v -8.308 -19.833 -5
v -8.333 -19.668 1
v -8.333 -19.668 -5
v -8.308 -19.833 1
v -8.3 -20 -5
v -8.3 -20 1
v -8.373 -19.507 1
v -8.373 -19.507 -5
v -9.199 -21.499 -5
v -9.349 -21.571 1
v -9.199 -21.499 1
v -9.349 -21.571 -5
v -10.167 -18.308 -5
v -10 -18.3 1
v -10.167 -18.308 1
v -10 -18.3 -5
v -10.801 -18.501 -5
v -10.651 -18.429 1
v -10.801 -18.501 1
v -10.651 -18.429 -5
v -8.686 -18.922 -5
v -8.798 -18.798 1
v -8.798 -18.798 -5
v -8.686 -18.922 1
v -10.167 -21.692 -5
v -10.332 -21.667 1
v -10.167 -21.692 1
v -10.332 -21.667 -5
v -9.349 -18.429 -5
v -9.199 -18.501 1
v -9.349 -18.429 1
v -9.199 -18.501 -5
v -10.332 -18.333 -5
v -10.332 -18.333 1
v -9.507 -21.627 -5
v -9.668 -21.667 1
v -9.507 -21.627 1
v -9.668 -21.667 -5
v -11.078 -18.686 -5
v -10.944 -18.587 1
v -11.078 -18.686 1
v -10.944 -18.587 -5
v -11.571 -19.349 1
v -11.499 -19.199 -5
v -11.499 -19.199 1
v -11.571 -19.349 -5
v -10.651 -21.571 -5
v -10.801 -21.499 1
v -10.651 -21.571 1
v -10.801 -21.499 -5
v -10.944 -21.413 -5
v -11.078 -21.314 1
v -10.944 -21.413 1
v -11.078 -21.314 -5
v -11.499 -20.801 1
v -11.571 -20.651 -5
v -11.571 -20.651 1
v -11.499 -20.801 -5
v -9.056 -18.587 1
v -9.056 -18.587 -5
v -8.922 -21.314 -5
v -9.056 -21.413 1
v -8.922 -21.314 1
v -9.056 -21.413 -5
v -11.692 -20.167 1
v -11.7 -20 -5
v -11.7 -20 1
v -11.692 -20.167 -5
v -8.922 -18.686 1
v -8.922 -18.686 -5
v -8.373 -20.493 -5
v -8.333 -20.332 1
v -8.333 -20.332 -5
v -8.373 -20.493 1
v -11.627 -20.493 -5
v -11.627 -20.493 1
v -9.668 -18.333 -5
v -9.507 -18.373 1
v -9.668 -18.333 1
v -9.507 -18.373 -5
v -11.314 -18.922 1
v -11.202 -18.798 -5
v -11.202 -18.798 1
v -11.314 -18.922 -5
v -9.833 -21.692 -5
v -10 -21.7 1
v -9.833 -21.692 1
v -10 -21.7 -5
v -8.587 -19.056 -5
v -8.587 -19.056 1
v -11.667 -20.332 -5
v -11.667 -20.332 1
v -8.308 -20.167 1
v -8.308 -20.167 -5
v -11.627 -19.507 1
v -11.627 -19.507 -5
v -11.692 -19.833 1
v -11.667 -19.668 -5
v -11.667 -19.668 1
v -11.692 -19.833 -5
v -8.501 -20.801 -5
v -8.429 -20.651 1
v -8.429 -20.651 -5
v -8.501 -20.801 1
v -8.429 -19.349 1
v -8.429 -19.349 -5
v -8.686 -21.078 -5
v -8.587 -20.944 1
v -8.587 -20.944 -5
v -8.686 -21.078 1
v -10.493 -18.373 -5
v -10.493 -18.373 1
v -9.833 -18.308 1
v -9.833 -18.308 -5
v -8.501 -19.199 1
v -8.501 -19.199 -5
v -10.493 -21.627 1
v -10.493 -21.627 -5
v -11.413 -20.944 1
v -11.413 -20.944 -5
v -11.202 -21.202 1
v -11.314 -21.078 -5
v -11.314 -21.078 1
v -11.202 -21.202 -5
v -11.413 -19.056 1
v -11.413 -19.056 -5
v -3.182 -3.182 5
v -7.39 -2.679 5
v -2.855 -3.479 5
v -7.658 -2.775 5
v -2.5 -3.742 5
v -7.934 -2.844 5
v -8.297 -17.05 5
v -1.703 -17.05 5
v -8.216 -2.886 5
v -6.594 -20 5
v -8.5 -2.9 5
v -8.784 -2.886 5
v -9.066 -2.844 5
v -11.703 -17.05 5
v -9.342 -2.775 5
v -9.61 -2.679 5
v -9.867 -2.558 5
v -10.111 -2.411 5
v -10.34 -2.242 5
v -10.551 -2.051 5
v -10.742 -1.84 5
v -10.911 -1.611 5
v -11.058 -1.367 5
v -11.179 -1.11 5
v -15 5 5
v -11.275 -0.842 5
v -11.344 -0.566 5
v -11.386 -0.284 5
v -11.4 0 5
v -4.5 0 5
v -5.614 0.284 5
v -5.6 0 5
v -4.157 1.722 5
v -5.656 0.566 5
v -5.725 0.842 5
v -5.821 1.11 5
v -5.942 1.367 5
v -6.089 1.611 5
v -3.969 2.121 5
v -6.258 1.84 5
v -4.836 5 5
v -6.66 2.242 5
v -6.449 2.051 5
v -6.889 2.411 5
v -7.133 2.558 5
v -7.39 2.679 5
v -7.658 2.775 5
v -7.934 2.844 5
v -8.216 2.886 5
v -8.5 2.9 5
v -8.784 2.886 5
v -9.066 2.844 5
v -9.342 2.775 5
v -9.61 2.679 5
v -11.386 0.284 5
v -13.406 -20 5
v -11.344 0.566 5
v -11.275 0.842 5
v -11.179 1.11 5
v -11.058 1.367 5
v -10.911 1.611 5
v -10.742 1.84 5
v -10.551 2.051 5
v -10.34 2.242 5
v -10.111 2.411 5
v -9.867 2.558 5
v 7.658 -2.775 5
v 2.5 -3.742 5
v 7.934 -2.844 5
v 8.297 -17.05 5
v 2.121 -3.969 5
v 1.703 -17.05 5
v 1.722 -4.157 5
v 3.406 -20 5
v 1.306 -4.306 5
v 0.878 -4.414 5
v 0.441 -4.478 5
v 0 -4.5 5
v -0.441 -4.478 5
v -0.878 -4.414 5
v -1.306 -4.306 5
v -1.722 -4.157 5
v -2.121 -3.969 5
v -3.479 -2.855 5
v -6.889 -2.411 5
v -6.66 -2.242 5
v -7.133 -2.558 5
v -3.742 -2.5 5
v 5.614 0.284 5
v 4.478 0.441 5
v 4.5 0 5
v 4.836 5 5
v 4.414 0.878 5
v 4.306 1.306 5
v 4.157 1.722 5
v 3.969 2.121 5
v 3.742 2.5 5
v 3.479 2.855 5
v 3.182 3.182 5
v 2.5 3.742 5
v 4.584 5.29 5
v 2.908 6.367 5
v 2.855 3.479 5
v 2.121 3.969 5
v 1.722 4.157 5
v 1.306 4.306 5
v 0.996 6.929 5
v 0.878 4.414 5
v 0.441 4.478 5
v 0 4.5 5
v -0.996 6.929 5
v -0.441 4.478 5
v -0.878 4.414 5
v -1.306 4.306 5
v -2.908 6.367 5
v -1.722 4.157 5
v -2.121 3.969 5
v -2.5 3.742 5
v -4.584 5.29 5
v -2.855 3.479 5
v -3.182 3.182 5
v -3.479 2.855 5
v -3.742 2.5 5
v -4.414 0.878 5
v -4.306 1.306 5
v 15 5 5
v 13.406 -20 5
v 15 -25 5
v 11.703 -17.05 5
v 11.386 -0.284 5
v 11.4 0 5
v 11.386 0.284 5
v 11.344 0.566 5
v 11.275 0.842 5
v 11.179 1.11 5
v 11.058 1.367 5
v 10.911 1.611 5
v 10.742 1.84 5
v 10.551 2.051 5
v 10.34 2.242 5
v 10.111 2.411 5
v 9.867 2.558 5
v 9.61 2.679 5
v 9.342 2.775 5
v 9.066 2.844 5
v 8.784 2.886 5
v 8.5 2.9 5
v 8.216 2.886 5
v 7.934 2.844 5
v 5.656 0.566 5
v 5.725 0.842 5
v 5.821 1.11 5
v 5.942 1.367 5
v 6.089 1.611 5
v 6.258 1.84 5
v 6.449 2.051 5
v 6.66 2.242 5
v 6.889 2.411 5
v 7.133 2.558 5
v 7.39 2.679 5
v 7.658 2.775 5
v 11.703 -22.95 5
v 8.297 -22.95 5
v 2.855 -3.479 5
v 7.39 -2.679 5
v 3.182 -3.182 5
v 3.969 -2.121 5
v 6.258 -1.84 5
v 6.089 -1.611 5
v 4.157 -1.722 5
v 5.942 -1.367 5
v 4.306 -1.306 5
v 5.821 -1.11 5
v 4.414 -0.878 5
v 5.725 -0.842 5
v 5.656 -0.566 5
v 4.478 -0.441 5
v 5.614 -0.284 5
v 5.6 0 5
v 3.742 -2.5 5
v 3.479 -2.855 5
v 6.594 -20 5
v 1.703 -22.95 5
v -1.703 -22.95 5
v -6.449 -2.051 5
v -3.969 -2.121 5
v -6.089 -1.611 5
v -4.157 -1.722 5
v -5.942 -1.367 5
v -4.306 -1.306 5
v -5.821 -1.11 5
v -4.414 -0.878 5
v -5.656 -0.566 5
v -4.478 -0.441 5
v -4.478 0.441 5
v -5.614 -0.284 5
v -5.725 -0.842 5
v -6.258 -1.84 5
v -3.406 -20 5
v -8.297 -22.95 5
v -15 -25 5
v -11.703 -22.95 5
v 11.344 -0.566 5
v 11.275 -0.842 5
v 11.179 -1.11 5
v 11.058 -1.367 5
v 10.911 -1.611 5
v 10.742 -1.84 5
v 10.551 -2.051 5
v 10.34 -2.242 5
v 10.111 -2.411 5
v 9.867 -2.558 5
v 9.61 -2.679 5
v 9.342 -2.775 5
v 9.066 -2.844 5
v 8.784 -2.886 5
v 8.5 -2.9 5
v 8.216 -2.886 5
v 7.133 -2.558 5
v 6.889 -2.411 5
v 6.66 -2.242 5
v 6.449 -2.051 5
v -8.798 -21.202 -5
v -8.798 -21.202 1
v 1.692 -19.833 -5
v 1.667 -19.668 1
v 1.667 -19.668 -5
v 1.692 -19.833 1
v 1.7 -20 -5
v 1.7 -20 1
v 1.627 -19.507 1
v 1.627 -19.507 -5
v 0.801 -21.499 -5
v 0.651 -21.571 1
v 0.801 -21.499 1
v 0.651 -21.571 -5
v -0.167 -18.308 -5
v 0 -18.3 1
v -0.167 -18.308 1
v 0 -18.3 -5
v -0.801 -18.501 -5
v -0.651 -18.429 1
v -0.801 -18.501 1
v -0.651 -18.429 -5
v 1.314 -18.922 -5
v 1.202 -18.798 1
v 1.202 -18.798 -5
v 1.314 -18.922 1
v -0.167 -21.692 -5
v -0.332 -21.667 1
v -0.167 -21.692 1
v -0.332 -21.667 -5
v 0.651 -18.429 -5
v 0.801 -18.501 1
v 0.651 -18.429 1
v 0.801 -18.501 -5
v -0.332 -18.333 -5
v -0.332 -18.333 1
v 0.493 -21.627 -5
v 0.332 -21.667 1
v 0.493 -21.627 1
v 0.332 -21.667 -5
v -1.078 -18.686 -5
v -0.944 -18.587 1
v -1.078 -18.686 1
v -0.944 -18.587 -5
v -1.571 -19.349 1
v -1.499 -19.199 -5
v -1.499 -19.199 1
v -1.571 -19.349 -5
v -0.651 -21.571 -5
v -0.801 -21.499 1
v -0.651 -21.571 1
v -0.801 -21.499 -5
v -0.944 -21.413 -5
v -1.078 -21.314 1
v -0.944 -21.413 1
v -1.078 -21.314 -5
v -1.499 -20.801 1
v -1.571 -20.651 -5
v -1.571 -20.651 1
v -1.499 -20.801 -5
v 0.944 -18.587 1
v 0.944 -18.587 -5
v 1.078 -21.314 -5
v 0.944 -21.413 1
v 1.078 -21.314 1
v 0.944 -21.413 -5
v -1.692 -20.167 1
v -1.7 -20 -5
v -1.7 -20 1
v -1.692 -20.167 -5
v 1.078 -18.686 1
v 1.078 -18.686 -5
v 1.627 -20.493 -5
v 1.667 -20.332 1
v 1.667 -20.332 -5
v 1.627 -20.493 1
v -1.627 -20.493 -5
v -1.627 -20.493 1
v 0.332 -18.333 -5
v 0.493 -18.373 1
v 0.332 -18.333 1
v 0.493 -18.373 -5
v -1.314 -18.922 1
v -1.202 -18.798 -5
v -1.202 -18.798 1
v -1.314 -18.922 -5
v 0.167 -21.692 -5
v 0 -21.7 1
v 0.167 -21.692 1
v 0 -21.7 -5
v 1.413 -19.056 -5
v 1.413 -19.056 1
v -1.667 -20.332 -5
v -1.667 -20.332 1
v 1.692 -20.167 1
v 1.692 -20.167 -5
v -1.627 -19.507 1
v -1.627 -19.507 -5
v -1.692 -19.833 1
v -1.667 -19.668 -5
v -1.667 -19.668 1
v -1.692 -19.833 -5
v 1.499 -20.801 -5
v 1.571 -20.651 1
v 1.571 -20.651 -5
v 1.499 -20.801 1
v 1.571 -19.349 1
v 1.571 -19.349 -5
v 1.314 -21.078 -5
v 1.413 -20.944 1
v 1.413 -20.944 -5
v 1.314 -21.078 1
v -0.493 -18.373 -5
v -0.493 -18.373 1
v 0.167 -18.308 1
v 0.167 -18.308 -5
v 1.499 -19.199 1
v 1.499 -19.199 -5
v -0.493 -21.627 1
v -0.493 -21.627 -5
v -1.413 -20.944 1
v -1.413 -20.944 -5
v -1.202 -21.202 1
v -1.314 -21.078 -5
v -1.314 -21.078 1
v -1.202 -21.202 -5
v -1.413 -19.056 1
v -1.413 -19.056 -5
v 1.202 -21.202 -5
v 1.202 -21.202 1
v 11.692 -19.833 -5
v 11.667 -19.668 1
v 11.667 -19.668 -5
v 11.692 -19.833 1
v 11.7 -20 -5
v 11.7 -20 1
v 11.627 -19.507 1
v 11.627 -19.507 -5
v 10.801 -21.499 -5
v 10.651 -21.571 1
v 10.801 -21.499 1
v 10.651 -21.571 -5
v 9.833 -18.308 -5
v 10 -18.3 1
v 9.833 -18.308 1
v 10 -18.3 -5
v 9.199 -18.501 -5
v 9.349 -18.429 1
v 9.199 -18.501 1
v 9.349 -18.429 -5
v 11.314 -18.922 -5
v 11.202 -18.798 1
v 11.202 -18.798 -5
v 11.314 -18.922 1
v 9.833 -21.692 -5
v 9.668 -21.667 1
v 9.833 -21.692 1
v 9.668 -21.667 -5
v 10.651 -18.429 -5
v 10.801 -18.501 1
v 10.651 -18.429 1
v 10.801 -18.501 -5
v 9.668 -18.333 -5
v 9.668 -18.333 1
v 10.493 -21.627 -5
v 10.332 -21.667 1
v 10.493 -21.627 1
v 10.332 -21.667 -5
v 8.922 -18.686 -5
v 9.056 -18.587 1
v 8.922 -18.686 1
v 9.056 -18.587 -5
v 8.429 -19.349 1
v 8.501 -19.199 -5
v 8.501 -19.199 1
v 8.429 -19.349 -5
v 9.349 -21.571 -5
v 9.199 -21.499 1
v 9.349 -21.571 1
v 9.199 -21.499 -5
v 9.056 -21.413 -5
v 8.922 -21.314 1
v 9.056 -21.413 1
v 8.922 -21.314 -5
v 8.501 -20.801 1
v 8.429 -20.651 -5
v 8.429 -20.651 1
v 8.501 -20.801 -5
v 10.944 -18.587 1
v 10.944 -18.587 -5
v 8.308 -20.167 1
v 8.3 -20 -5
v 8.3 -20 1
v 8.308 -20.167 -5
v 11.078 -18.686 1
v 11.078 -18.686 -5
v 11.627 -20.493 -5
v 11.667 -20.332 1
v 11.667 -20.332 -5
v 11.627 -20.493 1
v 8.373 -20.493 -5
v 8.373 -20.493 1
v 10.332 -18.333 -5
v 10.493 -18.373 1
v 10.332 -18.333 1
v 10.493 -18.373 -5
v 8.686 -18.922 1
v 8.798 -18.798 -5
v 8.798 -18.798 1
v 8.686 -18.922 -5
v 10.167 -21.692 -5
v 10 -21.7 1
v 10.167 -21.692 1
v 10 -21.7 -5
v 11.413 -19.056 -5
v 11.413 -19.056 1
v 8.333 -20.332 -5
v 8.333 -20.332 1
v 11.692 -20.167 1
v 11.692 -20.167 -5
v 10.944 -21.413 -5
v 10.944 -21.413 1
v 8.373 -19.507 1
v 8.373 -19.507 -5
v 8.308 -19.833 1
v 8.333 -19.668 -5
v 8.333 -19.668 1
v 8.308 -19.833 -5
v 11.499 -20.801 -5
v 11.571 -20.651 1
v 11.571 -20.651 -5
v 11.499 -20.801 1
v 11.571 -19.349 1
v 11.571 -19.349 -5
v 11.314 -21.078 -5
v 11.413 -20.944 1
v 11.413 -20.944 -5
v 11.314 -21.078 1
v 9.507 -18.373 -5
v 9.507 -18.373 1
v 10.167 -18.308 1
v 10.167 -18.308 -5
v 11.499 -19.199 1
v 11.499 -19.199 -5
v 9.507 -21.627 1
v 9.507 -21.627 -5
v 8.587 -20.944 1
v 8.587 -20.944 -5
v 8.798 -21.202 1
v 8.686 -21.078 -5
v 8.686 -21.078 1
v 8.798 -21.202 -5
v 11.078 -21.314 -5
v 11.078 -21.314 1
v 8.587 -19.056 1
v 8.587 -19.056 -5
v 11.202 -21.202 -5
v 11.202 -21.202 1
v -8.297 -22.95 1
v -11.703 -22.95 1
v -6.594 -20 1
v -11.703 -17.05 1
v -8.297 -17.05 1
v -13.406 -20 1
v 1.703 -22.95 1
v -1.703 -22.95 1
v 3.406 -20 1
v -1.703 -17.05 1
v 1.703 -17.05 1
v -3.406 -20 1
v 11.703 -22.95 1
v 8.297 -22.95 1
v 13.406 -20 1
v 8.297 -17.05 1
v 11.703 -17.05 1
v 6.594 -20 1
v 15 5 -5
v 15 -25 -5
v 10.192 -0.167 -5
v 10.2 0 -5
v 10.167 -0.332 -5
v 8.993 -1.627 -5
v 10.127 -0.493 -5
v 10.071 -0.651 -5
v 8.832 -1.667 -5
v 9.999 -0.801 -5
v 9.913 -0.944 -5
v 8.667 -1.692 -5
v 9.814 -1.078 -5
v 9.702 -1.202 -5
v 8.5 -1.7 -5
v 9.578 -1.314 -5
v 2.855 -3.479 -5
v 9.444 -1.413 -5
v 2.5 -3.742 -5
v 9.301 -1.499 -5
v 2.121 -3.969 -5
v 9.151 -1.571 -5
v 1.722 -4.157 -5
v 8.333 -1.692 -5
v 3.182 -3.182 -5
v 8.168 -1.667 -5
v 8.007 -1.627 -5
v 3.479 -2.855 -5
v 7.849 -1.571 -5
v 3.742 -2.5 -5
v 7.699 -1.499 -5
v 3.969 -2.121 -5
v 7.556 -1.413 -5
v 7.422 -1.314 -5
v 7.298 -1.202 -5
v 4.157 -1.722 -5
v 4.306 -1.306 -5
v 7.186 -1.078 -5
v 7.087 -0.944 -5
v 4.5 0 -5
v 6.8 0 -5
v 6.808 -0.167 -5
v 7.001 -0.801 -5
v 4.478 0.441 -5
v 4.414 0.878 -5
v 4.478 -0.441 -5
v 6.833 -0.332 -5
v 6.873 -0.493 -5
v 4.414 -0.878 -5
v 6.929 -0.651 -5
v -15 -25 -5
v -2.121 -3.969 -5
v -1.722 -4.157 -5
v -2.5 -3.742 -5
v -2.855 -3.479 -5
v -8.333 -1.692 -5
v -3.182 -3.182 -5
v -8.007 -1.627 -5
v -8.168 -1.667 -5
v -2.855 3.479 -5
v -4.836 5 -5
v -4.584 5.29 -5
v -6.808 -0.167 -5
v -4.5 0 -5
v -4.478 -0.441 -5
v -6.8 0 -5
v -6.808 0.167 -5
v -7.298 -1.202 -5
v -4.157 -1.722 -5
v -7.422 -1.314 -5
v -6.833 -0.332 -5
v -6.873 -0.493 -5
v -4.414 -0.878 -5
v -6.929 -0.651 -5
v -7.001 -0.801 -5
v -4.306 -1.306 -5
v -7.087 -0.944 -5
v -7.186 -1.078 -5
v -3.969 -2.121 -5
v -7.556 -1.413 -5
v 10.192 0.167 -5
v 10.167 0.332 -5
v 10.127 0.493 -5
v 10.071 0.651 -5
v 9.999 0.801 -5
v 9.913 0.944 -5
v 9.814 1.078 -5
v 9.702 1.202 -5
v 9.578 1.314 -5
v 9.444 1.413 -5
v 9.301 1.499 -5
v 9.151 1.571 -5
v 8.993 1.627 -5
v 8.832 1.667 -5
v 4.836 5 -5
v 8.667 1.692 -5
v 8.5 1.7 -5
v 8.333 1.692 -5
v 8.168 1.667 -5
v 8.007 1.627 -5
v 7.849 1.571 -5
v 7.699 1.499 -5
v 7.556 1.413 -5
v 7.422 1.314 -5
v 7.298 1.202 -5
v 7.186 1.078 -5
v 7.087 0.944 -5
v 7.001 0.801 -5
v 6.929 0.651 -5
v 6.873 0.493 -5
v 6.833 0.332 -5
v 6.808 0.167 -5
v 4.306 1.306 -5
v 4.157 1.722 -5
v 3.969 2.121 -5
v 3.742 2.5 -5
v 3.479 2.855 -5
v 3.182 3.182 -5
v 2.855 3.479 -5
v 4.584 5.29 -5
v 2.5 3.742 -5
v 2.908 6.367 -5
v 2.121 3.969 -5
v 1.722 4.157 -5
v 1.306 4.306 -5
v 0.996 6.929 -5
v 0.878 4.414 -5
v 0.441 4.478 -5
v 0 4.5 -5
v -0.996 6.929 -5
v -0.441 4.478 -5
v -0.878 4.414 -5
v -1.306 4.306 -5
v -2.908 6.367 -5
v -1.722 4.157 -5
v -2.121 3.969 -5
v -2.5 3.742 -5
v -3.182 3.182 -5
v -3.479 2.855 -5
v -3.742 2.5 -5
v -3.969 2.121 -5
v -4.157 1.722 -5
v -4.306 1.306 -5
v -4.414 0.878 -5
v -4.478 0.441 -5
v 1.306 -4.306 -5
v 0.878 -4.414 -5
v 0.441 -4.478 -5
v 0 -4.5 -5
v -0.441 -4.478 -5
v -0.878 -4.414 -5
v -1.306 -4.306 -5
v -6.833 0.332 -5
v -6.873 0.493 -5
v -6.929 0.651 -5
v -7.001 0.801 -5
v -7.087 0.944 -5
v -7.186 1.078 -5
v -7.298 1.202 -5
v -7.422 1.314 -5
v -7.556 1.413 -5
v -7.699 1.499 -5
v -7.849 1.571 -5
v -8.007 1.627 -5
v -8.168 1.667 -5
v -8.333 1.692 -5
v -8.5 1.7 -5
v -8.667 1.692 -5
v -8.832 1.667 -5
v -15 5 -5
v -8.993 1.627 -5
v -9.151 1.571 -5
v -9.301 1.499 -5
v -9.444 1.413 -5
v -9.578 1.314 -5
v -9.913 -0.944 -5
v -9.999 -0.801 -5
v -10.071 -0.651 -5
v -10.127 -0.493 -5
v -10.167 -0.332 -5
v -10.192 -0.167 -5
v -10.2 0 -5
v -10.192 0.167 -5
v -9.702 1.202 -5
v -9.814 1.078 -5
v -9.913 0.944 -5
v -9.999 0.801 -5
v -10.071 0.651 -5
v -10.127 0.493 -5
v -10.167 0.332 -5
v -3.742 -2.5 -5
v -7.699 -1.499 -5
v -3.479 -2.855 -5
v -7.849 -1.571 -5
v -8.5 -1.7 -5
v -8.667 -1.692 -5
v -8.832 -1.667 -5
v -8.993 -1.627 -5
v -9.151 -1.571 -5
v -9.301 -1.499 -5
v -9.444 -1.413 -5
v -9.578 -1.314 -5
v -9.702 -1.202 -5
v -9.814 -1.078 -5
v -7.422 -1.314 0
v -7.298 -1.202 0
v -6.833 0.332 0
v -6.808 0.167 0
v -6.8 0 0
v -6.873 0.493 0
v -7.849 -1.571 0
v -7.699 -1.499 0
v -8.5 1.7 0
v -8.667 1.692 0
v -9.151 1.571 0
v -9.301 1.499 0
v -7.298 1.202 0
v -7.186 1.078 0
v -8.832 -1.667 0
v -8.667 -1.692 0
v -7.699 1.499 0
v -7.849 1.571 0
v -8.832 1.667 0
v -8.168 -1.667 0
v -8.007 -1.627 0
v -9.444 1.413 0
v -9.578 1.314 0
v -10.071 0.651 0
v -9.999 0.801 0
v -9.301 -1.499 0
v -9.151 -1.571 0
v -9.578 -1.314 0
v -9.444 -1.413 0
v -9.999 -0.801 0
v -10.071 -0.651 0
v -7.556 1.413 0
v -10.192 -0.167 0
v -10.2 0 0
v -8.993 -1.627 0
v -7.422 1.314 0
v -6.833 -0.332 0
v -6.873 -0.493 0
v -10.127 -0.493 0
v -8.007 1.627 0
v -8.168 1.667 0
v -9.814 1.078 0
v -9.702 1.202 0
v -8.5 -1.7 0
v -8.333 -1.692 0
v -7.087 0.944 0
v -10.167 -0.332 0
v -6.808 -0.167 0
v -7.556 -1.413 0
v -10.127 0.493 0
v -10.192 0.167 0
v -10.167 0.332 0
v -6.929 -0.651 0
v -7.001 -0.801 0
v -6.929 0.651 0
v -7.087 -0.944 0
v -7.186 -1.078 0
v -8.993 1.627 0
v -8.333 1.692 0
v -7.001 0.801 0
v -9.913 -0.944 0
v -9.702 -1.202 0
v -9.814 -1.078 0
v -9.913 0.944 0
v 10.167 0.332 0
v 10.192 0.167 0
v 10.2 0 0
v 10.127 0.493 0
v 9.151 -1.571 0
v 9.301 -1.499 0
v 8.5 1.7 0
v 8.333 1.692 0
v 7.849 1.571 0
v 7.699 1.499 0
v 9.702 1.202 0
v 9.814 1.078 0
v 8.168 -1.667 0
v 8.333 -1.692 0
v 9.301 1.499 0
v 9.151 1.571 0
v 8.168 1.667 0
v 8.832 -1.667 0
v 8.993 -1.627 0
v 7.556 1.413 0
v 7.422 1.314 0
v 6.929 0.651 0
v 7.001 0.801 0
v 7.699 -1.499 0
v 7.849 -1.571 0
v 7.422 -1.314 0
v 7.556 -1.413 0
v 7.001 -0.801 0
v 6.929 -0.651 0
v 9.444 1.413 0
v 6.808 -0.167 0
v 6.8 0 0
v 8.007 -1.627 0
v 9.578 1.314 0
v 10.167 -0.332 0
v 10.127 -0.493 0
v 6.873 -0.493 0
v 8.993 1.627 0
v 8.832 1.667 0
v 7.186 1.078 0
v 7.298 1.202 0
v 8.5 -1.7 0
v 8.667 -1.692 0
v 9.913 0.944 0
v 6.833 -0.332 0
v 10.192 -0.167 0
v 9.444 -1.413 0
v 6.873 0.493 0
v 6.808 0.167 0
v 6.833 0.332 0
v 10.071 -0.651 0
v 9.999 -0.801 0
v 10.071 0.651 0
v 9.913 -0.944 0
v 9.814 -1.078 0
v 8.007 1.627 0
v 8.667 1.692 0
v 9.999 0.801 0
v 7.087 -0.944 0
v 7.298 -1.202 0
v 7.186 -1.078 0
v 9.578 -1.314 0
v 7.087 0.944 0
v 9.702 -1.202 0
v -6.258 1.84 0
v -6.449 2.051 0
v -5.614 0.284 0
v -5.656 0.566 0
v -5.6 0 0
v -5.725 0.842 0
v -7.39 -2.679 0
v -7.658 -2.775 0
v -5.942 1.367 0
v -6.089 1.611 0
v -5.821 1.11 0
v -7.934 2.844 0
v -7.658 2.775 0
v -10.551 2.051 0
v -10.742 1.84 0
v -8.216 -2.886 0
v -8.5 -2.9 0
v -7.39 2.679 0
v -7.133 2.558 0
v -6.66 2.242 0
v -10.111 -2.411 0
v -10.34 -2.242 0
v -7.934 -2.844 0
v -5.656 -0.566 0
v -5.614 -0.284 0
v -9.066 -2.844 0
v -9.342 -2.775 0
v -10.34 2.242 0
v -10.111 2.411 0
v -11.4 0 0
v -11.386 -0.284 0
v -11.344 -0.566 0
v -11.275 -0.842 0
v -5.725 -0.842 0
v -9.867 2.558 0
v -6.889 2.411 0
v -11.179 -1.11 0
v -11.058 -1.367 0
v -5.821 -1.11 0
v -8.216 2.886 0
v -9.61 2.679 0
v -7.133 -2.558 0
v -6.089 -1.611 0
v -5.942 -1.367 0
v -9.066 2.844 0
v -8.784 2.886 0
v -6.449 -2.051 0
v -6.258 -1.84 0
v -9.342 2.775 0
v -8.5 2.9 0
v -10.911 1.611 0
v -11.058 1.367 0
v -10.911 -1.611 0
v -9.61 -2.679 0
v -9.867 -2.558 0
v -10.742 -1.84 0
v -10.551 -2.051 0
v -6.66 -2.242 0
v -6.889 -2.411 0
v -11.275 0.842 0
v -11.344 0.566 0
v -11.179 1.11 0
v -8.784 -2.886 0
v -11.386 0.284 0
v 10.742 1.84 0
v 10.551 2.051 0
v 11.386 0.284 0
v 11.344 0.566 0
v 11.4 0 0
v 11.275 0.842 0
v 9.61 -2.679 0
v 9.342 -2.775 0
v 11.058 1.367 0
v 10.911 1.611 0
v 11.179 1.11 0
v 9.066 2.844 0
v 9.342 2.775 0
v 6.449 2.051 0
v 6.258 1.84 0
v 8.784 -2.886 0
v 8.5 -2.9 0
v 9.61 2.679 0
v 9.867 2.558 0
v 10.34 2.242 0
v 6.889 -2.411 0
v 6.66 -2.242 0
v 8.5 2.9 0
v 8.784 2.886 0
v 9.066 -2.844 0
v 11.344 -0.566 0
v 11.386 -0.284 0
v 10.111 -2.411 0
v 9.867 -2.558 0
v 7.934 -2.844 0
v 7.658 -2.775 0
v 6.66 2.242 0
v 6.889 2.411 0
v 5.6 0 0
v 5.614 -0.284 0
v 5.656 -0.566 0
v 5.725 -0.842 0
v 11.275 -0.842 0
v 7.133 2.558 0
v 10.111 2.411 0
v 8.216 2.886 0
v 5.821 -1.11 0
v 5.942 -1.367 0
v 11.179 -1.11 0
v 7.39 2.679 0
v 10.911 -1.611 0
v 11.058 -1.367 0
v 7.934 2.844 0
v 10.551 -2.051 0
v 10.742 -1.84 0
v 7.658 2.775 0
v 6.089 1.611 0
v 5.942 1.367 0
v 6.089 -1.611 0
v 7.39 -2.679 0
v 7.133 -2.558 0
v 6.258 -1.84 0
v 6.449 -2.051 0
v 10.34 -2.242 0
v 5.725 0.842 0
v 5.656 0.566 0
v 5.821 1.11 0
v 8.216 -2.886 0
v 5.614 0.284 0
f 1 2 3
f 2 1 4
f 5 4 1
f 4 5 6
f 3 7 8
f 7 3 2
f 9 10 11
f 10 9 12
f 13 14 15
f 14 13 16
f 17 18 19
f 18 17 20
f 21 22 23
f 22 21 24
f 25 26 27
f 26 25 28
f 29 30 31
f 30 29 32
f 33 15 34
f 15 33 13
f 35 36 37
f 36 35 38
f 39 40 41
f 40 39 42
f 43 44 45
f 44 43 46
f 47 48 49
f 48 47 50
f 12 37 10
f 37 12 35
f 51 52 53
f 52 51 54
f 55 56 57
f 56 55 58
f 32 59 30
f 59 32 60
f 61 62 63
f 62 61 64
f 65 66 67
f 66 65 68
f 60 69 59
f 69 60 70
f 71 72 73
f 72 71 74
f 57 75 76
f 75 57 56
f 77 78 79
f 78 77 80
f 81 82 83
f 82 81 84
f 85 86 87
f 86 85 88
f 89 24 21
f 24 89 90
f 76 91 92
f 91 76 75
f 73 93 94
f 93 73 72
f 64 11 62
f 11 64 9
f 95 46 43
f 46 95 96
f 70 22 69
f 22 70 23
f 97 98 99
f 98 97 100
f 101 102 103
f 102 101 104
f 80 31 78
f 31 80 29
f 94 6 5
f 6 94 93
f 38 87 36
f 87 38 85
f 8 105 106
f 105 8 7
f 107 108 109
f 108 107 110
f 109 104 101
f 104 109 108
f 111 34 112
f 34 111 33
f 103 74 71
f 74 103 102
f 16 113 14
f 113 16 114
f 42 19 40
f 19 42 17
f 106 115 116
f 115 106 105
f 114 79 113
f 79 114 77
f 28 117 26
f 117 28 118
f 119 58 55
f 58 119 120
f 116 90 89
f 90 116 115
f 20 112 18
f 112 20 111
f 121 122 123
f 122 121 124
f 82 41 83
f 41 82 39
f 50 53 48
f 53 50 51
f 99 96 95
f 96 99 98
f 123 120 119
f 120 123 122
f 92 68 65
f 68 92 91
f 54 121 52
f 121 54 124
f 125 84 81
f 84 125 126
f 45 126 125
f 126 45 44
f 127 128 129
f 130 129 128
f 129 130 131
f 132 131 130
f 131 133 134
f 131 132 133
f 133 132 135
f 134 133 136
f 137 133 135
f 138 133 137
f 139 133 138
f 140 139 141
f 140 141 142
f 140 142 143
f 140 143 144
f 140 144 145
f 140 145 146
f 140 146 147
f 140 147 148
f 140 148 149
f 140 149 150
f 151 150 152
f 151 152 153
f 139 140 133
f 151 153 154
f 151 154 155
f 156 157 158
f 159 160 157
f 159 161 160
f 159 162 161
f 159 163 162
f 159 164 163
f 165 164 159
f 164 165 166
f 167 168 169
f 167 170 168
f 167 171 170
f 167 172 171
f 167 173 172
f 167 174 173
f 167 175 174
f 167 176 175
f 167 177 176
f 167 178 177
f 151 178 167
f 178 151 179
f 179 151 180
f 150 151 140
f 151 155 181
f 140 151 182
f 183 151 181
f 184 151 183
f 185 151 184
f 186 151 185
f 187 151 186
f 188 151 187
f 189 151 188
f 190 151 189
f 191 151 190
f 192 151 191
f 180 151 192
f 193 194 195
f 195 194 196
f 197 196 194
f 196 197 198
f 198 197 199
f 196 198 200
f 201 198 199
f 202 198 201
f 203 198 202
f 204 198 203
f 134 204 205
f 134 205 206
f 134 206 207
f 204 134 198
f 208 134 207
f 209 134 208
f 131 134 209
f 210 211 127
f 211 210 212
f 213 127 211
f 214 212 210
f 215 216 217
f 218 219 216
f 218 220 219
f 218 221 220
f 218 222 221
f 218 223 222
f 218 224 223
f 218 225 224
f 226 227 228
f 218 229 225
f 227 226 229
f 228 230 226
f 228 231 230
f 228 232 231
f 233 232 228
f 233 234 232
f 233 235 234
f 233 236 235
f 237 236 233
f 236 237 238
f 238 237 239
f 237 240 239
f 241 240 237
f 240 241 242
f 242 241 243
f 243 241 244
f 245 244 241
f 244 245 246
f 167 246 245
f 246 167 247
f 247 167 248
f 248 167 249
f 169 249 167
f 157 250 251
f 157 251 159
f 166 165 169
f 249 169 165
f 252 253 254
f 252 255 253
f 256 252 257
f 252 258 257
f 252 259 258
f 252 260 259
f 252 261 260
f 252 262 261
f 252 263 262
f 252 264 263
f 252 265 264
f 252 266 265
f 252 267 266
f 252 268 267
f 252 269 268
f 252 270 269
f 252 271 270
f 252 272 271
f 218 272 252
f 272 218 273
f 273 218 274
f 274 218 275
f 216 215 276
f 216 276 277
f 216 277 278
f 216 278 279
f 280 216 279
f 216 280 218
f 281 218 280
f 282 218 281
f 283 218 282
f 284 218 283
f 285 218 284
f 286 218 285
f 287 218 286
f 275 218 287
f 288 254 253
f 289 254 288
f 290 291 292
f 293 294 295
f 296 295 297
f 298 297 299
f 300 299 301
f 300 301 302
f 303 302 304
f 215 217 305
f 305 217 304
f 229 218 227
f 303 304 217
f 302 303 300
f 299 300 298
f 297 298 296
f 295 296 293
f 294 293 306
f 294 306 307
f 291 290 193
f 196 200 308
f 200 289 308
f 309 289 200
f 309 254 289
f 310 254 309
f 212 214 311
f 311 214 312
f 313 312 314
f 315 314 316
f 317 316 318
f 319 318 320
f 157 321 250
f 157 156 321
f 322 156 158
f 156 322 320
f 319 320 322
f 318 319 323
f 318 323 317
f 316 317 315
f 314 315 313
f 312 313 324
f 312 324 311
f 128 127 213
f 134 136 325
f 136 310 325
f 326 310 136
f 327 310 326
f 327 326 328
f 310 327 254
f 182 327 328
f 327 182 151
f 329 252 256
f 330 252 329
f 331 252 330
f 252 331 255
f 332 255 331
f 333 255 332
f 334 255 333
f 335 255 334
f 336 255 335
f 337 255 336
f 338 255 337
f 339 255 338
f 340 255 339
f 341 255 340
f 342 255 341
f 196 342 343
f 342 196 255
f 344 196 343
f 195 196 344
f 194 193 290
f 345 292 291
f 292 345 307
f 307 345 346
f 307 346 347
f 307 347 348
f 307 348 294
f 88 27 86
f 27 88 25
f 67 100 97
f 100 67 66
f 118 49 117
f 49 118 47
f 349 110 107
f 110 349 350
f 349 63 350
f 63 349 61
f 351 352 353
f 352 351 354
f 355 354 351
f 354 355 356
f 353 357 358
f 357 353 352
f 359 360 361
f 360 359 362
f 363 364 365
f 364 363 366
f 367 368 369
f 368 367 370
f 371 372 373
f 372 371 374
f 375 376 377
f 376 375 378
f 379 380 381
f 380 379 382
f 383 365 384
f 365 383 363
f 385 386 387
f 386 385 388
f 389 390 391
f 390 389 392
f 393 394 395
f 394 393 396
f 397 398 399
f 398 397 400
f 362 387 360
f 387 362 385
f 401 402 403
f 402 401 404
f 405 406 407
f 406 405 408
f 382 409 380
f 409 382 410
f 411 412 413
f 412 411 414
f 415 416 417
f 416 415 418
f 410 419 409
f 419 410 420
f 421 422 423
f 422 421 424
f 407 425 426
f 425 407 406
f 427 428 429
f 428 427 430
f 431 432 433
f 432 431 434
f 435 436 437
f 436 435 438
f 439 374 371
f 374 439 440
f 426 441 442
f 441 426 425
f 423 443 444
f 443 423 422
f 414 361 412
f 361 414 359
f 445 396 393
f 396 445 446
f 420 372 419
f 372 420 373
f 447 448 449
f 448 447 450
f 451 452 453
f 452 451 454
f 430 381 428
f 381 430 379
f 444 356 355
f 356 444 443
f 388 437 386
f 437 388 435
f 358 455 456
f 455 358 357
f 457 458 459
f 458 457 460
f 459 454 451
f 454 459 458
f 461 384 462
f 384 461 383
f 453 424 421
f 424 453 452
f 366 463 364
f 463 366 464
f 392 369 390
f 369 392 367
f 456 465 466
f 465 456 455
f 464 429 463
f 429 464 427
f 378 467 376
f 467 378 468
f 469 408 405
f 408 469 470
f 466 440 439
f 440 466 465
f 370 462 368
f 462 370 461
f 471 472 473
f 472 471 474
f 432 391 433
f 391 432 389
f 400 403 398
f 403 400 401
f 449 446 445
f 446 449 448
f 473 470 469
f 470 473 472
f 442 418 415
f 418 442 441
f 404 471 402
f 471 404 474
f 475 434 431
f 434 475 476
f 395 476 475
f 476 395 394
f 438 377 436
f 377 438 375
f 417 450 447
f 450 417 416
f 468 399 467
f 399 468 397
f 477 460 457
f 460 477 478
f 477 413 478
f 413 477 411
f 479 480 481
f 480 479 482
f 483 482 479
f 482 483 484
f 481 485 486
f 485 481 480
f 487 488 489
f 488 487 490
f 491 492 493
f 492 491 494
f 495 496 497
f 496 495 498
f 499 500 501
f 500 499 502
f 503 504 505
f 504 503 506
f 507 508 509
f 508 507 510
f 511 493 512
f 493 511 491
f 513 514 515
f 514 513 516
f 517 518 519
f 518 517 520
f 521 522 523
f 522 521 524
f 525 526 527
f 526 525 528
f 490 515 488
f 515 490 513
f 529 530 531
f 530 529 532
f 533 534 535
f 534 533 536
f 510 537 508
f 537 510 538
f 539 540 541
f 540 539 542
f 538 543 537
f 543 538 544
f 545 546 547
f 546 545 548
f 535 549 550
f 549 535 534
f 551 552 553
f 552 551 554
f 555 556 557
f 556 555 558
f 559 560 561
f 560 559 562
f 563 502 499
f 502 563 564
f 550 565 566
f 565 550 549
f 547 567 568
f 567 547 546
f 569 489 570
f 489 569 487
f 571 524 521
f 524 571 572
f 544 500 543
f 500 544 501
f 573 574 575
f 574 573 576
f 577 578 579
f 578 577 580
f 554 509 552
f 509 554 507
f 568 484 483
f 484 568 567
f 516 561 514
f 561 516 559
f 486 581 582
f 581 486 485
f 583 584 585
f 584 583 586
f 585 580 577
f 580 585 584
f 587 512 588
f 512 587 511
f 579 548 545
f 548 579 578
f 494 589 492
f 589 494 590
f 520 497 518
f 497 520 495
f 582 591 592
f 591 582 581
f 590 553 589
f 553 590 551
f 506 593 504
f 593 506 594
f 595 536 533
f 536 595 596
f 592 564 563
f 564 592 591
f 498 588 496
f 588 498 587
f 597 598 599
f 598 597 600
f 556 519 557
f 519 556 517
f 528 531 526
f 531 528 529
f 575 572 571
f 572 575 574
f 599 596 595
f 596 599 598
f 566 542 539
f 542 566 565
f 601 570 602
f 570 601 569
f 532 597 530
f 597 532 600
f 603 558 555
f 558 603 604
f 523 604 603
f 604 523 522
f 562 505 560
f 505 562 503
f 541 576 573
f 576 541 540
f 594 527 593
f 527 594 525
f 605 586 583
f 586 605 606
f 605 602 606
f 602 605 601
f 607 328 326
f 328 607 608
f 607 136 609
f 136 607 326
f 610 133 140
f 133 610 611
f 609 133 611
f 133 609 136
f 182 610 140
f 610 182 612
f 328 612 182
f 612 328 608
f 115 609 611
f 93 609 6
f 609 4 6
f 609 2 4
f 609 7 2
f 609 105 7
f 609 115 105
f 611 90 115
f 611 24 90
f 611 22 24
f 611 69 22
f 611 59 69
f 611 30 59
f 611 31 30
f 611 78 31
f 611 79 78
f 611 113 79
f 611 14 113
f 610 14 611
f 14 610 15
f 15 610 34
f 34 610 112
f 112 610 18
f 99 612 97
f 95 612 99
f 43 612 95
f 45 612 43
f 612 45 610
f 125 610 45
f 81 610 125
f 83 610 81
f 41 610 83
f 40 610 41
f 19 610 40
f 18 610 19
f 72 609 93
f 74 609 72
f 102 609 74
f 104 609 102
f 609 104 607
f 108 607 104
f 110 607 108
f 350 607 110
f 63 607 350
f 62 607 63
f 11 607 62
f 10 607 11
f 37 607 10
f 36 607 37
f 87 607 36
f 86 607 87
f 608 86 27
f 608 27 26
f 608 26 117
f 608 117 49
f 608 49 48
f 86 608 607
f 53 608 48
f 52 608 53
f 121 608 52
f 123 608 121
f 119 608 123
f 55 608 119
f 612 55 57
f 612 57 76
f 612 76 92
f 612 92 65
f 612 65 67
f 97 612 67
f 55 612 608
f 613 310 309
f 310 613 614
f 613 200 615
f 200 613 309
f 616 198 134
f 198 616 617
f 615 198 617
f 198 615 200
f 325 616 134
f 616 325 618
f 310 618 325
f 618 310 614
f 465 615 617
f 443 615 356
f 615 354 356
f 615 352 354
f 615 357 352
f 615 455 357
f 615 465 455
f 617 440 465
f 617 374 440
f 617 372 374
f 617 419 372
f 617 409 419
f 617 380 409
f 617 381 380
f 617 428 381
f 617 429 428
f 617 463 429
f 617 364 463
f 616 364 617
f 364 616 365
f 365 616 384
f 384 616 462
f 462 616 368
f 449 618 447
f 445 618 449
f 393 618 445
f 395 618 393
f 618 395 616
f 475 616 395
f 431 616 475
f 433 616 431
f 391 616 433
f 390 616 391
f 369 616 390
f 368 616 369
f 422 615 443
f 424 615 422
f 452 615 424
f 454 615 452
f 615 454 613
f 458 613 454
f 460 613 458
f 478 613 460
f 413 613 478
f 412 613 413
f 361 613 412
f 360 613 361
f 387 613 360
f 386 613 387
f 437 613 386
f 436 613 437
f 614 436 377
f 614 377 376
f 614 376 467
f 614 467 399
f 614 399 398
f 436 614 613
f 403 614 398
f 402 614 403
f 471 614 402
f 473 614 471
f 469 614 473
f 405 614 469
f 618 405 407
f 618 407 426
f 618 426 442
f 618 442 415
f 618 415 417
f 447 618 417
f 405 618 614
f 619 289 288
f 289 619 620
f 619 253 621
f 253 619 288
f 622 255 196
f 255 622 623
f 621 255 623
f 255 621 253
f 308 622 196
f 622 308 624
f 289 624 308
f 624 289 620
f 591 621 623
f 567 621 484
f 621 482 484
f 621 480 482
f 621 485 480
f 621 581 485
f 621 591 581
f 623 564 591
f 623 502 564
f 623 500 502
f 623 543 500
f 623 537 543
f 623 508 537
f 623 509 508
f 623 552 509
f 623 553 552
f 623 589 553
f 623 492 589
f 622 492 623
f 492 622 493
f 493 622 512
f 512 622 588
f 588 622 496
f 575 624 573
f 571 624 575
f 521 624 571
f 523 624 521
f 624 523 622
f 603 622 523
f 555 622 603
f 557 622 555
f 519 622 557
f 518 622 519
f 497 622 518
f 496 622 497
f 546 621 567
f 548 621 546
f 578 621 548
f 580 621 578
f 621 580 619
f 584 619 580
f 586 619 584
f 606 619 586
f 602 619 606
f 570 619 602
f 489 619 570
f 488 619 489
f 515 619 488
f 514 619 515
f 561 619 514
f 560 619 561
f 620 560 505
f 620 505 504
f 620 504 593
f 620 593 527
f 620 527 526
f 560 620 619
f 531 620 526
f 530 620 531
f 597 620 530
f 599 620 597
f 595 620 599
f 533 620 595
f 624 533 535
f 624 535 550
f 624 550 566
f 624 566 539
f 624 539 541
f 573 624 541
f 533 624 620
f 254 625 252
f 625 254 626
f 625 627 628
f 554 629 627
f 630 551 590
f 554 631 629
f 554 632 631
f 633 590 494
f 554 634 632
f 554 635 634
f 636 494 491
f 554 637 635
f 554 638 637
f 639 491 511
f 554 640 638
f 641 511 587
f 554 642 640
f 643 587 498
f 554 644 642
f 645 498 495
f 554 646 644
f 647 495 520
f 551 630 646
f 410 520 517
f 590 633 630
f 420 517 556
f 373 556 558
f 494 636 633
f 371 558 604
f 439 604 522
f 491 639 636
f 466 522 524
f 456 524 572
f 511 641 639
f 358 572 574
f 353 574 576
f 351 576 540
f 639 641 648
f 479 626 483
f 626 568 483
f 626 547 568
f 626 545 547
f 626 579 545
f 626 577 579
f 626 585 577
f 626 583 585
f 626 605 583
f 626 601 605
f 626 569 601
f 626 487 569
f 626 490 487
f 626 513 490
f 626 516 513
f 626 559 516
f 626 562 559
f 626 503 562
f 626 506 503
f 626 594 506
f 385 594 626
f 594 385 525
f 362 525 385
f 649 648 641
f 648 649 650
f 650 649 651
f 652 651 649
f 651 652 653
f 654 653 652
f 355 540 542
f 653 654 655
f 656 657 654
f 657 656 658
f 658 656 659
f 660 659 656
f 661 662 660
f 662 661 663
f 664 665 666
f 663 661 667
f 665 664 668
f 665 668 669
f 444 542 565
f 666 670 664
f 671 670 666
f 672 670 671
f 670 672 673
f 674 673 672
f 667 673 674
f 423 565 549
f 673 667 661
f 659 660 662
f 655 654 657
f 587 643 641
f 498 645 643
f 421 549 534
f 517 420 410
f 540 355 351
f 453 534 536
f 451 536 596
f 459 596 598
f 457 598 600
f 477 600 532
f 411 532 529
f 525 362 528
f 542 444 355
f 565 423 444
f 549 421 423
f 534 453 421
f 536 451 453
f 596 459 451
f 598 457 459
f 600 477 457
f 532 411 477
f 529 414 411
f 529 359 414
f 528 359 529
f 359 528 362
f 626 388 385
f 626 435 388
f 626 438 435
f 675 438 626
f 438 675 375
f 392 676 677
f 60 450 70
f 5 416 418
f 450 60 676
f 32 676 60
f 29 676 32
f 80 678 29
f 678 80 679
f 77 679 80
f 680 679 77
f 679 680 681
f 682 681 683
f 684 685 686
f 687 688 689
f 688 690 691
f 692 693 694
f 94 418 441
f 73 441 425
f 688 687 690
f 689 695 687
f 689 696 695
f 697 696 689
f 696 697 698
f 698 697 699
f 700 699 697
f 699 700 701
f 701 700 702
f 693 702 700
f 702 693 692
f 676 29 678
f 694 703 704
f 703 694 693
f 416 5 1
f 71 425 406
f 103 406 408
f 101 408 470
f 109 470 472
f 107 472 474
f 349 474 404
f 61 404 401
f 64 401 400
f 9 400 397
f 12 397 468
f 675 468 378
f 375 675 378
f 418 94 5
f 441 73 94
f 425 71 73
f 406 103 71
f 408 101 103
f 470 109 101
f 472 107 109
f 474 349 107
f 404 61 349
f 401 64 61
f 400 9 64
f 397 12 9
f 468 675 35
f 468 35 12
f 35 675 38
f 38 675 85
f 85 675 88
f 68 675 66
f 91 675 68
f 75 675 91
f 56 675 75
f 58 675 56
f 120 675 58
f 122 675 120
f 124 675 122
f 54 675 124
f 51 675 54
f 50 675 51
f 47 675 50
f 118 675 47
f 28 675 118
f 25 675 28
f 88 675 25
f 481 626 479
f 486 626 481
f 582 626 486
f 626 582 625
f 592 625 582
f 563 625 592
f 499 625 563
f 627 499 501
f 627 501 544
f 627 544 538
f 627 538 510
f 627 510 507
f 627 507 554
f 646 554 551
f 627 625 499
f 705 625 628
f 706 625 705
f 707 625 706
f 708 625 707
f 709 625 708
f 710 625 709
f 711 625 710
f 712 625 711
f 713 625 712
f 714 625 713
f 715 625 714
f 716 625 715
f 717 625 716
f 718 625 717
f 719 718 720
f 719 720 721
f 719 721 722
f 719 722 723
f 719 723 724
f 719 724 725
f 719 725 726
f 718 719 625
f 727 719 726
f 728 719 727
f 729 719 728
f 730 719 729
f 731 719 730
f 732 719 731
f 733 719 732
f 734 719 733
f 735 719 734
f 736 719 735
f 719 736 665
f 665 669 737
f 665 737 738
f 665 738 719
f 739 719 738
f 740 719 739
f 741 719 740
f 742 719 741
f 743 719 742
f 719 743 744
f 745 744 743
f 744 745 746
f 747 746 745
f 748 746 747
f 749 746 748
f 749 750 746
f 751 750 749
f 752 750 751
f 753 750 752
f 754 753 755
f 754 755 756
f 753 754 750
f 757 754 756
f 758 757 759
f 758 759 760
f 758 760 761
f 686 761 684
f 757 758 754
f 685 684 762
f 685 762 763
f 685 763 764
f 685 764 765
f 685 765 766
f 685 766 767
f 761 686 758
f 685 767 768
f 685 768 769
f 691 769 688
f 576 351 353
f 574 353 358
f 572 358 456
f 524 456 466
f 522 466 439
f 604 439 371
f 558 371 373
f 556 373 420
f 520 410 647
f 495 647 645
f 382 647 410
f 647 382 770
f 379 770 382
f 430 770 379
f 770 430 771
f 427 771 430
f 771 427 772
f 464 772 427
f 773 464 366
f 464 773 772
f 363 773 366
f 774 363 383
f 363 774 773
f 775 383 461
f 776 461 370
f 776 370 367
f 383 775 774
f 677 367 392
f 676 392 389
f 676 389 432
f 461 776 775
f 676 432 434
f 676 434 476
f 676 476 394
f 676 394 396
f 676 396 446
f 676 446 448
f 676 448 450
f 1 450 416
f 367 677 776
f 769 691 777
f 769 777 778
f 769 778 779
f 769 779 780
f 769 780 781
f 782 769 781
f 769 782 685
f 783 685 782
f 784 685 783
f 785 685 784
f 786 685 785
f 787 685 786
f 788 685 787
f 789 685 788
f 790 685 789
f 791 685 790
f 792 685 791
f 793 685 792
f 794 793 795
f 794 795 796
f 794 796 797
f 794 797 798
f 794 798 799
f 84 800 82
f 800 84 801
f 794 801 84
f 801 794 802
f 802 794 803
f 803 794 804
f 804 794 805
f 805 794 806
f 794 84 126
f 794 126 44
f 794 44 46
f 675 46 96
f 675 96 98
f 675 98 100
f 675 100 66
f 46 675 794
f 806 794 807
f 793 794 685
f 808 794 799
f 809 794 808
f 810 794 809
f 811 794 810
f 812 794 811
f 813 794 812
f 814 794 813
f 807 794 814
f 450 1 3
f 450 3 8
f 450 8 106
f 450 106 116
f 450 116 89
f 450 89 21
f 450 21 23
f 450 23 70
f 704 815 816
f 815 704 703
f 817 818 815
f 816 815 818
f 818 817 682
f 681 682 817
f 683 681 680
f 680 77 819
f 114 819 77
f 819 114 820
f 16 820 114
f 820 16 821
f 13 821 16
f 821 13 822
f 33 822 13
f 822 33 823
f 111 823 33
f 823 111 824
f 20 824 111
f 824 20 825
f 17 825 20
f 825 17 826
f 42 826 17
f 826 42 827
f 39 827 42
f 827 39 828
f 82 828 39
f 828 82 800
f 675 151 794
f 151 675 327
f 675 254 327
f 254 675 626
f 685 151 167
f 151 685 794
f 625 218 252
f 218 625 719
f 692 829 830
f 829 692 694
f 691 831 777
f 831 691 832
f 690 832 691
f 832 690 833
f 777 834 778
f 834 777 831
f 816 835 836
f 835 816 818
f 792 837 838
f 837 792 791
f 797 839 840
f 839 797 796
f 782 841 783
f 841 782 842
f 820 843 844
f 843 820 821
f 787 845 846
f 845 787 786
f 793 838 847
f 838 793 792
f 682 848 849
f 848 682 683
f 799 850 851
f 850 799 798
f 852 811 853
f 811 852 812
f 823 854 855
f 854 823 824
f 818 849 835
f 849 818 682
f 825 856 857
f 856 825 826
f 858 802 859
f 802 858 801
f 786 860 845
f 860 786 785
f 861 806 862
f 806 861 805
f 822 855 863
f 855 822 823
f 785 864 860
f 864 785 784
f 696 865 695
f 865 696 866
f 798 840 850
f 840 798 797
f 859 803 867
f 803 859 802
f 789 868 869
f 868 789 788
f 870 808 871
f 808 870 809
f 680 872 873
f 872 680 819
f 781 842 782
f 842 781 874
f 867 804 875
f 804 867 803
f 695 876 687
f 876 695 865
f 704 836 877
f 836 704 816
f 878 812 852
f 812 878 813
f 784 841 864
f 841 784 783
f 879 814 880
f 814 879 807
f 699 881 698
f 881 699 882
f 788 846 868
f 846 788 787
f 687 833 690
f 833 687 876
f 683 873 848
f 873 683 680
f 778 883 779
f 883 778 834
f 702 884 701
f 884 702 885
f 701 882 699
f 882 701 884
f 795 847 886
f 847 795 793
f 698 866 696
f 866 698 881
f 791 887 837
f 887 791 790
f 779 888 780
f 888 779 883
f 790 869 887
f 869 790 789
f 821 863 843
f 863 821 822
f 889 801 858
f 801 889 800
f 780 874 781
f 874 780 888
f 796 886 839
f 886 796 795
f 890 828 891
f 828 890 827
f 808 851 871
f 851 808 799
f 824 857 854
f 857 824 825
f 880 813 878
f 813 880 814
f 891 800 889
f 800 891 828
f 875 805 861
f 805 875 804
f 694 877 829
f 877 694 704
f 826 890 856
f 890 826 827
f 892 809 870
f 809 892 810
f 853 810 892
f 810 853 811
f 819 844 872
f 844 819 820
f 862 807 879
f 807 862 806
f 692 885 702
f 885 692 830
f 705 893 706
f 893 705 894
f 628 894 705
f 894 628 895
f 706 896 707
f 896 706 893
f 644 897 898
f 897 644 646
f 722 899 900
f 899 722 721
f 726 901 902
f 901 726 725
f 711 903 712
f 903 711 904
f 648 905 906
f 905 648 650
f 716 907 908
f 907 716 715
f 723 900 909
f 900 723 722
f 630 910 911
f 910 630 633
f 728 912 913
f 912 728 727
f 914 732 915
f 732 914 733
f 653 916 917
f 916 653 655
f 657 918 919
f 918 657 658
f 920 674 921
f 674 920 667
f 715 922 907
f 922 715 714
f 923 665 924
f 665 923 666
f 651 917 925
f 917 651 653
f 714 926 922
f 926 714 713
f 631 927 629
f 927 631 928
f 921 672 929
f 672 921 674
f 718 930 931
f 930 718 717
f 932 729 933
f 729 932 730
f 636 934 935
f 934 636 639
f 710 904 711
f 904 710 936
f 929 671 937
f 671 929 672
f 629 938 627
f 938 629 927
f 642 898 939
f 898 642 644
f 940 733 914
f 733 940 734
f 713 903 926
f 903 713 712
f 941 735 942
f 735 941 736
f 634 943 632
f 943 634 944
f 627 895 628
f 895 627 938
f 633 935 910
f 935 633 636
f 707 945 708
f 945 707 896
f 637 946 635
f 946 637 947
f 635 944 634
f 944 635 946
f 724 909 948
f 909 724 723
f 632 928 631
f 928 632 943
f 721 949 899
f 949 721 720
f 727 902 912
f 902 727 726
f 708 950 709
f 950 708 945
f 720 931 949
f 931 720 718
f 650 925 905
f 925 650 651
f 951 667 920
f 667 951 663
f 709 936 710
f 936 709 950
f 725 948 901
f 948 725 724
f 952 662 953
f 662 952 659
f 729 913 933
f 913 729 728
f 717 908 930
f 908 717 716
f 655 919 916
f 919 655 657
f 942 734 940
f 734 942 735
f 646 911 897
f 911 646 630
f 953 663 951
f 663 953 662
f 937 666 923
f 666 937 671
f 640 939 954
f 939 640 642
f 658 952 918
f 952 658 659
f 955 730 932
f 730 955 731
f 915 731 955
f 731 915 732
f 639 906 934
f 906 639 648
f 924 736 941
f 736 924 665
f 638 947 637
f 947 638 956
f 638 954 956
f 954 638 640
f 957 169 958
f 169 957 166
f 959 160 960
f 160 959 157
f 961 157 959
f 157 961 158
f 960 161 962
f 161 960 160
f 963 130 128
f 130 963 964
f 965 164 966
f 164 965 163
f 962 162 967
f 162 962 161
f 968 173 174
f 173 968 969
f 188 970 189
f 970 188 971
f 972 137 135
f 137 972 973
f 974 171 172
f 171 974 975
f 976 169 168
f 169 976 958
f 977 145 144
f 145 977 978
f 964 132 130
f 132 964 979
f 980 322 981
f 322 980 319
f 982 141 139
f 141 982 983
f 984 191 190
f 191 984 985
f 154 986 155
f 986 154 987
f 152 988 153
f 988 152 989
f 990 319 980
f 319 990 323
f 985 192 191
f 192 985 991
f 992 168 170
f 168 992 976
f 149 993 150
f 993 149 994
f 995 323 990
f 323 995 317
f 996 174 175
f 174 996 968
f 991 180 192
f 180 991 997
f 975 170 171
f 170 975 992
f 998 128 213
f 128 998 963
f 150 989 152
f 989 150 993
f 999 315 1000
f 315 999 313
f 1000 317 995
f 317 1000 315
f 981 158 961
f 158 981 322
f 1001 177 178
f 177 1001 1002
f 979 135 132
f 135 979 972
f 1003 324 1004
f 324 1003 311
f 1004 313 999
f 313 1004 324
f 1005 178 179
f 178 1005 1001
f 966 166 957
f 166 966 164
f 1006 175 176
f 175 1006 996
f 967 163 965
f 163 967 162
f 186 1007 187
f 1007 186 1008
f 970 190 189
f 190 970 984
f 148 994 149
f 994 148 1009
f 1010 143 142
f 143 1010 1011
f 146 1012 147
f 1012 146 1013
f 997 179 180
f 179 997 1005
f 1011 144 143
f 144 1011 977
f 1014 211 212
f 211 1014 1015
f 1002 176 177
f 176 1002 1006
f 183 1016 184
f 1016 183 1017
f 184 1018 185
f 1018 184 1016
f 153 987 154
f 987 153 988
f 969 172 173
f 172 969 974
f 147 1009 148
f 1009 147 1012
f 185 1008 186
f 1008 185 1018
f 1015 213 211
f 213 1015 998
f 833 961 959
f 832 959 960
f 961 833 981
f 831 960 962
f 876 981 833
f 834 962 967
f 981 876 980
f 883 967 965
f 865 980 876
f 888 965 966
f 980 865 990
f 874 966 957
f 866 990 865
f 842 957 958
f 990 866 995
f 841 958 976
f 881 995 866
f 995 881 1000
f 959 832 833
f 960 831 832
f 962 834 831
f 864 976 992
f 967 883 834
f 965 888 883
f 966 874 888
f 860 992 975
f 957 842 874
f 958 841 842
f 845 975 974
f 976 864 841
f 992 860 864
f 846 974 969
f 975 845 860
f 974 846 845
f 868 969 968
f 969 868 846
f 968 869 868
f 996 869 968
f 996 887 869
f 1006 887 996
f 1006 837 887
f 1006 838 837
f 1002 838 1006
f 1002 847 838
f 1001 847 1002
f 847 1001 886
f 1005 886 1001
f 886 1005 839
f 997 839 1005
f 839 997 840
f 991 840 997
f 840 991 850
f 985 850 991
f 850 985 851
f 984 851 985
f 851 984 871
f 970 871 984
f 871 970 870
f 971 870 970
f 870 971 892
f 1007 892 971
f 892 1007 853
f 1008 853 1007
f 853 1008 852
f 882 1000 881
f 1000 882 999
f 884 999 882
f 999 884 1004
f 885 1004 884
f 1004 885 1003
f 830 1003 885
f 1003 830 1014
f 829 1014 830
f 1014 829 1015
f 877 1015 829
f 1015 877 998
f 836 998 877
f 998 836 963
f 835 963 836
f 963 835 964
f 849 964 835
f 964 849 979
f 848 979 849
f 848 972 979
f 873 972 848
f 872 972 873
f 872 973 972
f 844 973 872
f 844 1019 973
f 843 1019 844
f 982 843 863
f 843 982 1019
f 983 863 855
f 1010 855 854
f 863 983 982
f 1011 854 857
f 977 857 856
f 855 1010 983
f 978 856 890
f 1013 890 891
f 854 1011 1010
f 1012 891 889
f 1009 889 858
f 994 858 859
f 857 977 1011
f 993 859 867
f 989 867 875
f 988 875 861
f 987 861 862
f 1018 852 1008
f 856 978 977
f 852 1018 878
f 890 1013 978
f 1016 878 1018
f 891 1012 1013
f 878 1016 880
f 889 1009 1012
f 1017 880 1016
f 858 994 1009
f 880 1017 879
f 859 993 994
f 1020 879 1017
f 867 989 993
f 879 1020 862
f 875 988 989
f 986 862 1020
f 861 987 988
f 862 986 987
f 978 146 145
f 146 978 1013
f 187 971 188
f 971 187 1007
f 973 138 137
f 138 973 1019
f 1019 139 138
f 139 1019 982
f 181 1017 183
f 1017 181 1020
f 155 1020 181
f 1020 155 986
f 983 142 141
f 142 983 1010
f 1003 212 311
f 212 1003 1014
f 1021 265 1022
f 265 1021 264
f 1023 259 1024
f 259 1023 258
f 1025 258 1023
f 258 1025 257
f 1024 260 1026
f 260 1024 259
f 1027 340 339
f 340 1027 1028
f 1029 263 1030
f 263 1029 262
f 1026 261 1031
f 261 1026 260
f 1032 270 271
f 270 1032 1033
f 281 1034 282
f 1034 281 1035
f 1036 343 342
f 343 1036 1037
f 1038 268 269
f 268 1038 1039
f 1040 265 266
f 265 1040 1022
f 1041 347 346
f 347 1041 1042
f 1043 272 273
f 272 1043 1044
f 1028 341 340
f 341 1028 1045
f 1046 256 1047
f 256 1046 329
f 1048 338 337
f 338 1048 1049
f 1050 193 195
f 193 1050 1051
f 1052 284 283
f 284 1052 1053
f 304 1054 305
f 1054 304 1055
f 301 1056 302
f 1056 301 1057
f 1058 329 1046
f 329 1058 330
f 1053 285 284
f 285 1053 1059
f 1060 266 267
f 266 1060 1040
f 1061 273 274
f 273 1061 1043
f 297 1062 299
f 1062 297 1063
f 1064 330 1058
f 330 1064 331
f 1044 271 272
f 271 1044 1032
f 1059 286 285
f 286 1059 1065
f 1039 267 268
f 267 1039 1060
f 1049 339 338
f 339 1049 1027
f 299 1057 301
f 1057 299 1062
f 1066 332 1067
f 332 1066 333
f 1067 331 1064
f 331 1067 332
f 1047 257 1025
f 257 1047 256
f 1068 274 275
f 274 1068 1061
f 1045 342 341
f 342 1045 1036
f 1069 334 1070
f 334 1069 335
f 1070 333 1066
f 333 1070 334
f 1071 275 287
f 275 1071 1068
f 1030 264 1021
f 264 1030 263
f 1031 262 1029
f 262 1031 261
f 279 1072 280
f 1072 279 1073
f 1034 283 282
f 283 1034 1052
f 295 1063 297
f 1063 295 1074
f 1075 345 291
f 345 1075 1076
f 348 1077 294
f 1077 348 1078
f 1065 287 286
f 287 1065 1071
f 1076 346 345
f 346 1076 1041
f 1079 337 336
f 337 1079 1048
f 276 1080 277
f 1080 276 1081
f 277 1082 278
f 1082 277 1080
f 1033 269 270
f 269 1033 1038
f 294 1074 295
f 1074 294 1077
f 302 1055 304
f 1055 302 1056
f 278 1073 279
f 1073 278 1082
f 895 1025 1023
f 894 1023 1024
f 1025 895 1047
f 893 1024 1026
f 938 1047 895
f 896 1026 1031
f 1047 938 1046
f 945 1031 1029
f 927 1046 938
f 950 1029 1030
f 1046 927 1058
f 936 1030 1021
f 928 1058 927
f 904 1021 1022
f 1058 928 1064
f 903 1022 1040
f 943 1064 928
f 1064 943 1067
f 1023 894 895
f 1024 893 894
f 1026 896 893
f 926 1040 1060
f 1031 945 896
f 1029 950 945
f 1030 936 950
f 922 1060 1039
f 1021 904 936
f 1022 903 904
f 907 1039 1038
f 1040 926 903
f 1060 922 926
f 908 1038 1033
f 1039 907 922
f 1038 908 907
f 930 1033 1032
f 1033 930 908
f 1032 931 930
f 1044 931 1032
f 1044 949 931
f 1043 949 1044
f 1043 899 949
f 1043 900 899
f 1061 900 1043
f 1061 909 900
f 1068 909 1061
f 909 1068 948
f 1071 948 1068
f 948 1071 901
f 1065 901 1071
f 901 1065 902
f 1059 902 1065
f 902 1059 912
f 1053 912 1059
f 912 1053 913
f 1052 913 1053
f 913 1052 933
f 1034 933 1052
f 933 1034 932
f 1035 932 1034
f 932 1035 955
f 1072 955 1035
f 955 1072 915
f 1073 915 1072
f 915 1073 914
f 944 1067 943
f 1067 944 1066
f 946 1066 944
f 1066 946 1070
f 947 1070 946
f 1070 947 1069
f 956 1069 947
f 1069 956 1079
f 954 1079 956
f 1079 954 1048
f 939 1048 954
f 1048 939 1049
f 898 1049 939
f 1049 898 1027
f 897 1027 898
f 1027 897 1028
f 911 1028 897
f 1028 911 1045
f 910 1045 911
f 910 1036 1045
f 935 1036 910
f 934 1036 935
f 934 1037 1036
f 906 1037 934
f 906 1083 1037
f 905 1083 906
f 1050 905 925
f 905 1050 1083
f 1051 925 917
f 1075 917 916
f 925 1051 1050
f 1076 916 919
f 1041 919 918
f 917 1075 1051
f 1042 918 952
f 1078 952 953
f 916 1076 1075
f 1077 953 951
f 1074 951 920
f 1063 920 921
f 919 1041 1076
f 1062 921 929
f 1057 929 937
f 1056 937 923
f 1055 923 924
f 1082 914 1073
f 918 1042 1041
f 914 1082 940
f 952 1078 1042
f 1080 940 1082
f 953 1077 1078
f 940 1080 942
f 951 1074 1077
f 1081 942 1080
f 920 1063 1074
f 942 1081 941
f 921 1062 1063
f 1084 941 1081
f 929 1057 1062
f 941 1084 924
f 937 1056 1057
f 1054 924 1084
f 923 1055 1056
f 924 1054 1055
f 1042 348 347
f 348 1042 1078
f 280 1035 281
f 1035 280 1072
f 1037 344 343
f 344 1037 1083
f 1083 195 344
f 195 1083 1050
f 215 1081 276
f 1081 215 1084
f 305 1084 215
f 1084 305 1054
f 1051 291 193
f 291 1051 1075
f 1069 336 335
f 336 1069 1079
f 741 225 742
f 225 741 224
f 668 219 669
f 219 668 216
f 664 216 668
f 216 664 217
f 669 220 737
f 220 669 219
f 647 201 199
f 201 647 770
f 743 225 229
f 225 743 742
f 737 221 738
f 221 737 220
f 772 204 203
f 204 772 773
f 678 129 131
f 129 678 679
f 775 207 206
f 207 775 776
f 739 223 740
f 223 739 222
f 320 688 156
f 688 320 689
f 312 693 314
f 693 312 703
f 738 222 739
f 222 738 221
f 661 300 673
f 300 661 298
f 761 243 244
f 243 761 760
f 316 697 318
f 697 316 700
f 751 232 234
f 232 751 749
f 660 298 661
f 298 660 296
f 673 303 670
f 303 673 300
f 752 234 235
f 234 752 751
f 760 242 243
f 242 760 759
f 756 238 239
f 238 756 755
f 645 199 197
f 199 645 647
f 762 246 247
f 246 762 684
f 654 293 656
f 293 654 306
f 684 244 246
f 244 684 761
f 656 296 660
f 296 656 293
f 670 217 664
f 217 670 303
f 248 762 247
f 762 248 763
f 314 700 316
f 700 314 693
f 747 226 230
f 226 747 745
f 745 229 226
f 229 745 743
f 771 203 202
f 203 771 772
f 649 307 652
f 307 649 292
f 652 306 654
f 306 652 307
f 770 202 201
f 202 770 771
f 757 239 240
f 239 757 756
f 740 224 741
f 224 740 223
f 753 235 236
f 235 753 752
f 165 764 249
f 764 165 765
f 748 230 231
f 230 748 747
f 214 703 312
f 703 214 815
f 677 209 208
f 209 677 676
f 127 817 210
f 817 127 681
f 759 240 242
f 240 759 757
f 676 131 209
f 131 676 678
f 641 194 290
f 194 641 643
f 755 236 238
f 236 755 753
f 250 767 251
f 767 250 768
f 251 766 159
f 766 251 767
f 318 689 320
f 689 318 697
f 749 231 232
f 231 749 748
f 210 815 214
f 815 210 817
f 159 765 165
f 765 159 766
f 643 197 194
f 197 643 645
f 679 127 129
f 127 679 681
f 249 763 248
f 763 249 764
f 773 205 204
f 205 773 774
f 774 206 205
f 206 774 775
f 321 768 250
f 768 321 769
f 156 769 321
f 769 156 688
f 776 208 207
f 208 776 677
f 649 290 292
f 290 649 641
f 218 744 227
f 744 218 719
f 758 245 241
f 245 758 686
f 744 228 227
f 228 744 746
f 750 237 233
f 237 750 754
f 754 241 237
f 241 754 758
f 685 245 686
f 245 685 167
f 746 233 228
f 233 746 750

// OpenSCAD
difference() {
sidex=30;
sidey=50;
height=10;
cylinder_small=3.4;
cylinder_big=2*(5.5+0.4) / sqrt(3);
screw_head_height=1 ;
edges=6;
screw_head_m3 = 5.8;
    //Base Foot
cube([sidex,sidey,height], center=true);    
   
      //Difference Long Cube
translate([-16,5,-5.1])
    cube([31.2,20.2,10.2]);
    
    //Small Holes
    for(x=[-10:10:10]){    
translate([x,-20,-5])
   cylinder(d=cylinder_small, h=20,$fn=64,center=true);
translate([x,20,-5])    
   cylinder(d=cylinder_small, h=20,$fn=64,center=true);   
  }
    //Big Holes
    for(x=[-10:10:10]){   
translate([x,-20,screw_head_height])
   cylinder(d=cylinder_big, h=20,$fn=edges);    
translate([x,20,screw_head_height])
   cylinder(d=cylinder_big, h=20,$fn=edges);       
  }
  
  //Motor Hole 1
translate([-8.5,0,0])
   cylinder(d=cylinder_small, h=20,$fn=64,center=true);
  //Motor Hole 2
translate([8.5,0,0])
   cylinder(d=cylinder_small, h=20,$fn=64,center=true);
  //Motor Big Hole 1
translate([-8.5,0,0])
   cylinder(d=screw_head_m3, h=20,$fn=64);
  //Motor Big Hole 1  
translate([8.5,0,0])
   cylinder(d=screw_head_m3, h=20,$fn=64); 
  
  //Motor Center Hole
translate([0,0,-10])
    cylinder(d=9.0, h=20, $fn=64);
  
  
      
  
   
}

difference(){
    //Top Cylinder Bue
    cylinder(d=14,h=10,center=true);
    translate([0,-10,0])
    cube([25,29,10.5],center=true);
}
